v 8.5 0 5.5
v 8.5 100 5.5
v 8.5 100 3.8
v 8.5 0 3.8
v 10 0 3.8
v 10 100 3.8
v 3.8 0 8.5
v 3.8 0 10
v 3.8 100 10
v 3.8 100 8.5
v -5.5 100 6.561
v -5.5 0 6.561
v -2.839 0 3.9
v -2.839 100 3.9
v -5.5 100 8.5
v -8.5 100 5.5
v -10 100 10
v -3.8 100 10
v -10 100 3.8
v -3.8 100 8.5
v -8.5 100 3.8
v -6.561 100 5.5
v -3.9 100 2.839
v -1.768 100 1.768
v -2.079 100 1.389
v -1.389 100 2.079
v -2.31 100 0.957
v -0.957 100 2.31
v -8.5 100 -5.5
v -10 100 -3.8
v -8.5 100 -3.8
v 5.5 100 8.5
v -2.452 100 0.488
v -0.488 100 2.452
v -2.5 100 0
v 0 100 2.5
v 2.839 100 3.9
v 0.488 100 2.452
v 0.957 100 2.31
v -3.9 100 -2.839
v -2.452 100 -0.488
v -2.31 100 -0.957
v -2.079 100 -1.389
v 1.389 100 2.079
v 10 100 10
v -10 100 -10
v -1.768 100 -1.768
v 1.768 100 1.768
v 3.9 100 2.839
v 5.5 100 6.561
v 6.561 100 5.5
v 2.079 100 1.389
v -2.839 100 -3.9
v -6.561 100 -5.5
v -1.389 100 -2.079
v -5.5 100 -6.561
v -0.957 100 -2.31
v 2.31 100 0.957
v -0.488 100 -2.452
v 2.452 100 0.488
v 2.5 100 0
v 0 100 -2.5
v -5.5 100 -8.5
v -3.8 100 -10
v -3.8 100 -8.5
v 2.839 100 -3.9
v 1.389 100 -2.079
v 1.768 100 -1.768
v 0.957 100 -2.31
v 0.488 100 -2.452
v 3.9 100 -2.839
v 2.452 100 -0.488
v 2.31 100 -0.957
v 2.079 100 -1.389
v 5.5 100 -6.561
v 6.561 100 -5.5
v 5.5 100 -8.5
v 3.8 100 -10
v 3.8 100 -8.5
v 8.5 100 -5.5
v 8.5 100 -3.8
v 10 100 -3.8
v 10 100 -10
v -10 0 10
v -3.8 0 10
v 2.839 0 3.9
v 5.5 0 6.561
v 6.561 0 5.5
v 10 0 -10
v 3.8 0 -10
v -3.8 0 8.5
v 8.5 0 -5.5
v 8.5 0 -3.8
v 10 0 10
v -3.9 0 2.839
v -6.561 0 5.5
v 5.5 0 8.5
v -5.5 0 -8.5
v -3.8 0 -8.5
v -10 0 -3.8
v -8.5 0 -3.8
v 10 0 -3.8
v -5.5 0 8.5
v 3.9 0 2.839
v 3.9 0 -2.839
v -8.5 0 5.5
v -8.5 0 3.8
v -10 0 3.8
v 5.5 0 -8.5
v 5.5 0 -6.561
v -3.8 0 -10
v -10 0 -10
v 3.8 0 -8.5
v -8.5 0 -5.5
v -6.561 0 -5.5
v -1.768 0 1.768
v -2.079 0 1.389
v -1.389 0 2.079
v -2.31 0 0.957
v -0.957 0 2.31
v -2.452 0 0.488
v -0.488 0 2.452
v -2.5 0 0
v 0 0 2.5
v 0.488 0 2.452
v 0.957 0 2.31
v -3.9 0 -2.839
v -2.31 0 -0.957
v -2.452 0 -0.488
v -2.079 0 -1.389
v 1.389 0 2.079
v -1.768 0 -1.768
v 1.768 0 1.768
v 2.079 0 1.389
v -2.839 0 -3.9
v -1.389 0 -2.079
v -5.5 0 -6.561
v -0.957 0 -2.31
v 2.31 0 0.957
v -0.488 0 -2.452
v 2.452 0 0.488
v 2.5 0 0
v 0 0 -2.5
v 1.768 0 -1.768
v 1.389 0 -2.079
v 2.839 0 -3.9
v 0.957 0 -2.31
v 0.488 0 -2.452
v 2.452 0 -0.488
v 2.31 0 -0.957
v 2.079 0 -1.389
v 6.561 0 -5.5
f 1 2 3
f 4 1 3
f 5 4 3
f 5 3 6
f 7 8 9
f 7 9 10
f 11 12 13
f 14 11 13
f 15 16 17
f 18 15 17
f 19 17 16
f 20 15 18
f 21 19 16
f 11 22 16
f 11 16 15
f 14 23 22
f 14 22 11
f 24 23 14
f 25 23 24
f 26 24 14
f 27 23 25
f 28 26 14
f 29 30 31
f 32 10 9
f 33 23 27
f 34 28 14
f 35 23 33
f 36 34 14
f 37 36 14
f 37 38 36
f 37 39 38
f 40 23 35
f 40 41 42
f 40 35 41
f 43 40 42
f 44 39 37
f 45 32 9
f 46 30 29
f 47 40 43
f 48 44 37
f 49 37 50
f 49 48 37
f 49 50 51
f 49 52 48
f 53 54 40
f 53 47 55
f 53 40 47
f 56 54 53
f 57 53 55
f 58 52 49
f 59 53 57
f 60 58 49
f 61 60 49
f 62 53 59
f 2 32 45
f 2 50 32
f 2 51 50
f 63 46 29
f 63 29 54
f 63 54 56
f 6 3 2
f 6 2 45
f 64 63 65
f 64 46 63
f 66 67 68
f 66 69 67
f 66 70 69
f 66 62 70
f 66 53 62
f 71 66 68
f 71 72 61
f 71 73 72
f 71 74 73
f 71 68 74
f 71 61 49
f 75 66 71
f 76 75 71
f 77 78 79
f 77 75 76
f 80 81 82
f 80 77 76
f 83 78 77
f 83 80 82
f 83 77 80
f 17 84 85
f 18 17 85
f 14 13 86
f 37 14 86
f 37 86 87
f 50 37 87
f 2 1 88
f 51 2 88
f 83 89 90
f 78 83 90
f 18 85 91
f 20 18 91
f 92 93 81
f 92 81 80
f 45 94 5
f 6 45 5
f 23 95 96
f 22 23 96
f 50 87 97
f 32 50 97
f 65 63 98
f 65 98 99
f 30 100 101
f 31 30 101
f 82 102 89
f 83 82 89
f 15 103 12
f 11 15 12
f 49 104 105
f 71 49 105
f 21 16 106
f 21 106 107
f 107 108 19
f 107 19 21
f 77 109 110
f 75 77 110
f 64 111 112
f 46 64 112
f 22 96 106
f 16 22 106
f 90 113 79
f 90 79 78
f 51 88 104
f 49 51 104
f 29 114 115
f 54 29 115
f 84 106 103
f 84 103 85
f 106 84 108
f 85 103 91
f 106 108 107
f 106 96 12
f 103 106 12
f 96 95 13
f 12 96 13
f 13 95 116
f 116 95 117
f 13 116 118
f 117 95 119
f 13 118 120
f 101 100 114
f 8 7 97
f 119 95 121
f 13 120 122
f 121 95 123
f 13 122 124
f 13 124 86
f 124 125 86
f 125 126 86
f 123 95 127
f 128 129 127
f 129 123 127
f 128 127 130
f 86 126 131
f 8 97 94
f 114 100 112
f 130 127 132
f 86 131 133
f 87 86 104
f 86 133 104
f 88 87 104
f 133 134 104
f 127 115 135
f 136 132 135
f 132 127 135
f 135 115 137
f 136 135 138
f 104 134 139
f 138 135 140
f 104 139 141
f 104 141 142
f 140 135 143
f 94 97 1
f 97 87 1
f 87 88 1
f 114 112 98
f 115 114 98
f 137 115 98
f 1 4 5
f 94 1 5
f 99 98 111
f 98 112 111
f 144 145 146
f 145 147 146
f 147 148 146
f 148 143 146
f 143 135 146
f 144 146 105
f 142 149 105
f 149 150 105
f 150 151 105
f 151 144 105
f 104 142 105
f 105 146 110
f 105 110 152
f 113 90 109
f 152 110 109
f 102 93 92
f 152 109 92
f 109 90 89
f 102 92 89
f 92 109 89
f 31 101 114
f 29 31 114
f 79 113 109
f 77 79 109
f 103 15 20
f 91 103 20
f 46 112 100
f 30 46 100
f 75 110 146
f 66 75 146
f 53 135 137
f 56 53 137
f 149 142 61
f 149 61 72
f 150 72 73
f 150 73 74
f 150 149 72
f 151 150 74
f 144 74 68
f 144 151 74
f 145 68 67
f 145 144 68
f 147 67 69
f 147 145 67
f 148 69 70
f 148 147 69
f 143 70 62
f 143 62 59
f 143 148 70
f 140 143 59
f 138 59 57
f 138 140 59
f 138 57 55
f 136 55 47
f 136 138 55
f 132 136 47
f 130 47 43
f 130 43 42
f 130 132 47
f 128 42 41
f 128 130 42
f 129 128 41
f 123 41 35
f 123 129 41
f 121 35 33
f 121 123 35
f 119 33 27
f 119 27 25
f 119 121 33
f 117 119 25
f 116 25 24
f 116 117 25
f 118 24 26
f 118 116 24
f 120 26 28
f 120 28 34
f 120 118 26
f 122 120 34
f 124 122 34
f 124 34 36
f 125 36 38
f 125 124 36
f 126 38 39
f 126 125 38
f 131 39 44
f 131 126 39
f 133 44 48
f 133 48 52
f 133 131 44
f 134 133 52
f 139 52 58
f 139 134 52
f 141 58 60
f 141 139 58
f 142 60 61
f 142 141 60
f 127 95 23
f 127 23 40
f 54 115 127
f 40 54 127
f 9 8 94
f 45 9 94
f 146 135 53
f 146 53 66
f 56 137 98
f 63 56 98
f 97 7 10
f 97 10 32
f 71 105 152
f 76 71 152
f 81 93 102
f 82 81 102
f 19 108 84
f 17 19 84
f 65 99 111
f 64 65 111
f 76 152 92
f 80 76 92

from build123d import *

# Parameters (mm, degrees)
SKETCH_1_W      = 1.5
SKETCH_1_H      = 1.7
SKETCH_1_W_2    = 1.7
SKETCH_1_H_2    = 1.5
SKETCH_1_W_3    = 7.8
SKETCH_1_H_3    = 7.8
SKETCH_1_R      = 2.5
EXTRUDE_1_DEPTH = 100


with BuildPart() as part:
    # 草图1 → 凸台-拉伸1 (new body)
    with BuildSketch(Plane(origin=(0, 0, 0), x_dir=(1, 0, 0), z_dir=(0, 1, 0))):
        Polygon((5.5, 8.5), (5.5, 6.560660172), (5.5, 5.5), (6.560660172, 5.5), (8.5, 5.5), (10, 5.5), (10, 10), (5.5, 10), align=None)
        with Locations((9.25, 4.65)):
            Rectangle(SKETCH_1_W, SKETCH_1_H)
        Polygon((5.5, 6.560660172), (2.839339828, 3.9), (3.9, 3.9), (3.9, 2.839339828), (6.560660172, 5.5), (5.5, 5.5), align=None)
        with Locations((4.65, 9.25)):
            Rectangle(SKETCH_1_W_2, SKETCH_1_H_2)
        Rectangle(SKETCH_1_W_3, SKETCH_1_H_3)
        Circle(SKETCH_1_R, mode=Mode.SUBTRACT)
        with Locations((-4.65, 9.25)):
            Rectangle(SKETCH_1_W_2, SKETCH_1_H_2)
        Polygon((-8.5, 5.5), (-6.560660172, 5.5), (-5.5, 5.5), (-5.5, 6.560660172), (-5.5, 8.5), (-5.5, 10), (-10, 10), (-10, 5.5), align=None)
        with Locations((-9.25, 4.65)):
            Rectangle(SKETCH_1_W, SKETCH_1_H)
        Polygon((-5.5, 5.5), (-6.560660172, 5.5), (-3.9, 2.839339828), (-3.9, 3.9), (-2.839339828, 3.9), (-5.5, 6.560660172), align=None)
        Polygon((-5.5, -5.5), (-6.560660172, -5.5), (-8.5, -5.5), (-10, -5.5), (-10, -10), (-5.5, -10), (-5.5, -8.5), (-5.5, -6.560660172), align=None)
        with Locations((-4.65, -9.25)):
            Rectangle(SKETCH_1_W_2, SKETCH_1_H_2)
        with Locations((-9.25, -4.65)):
            Rectangle(SKETCH_1_W, SKETCH_1_H)
        Polygon((-3.9, -3.9), (-3.9, -2.839339828), (-6.560660172, -5.5), (-5.5, -5.5), (-5.5, -6.560660172), (-2.839339828, -3.9), align=None)
        Polygon((3.9, -3.9), (2.839339828, -3.9), (5.5, -6.560660172), (5.5, -5.5), (6.560660172, -5.5), (3.9, -2.839339828), align=None)
        Polygon((5.5, -5.5), (5.5, -6.560660172), (5.5, -8.5), (5.5, -10), (10, -10), (10, -5.5), (8.5, -5.5), (6.560660172, -5.5), align=None)
        with Locations((9.25, -4.65)):
            Rectangle(SKETCH_1_W, SKETCH_1_H)
        with Locations((4.65, -9.25)):
            Rectangle(SKETCH_1_W_2, SKETCH_1_H_2)
    extrude(amount=EXTRUDE_1_DEPTH)


solid = part.part
